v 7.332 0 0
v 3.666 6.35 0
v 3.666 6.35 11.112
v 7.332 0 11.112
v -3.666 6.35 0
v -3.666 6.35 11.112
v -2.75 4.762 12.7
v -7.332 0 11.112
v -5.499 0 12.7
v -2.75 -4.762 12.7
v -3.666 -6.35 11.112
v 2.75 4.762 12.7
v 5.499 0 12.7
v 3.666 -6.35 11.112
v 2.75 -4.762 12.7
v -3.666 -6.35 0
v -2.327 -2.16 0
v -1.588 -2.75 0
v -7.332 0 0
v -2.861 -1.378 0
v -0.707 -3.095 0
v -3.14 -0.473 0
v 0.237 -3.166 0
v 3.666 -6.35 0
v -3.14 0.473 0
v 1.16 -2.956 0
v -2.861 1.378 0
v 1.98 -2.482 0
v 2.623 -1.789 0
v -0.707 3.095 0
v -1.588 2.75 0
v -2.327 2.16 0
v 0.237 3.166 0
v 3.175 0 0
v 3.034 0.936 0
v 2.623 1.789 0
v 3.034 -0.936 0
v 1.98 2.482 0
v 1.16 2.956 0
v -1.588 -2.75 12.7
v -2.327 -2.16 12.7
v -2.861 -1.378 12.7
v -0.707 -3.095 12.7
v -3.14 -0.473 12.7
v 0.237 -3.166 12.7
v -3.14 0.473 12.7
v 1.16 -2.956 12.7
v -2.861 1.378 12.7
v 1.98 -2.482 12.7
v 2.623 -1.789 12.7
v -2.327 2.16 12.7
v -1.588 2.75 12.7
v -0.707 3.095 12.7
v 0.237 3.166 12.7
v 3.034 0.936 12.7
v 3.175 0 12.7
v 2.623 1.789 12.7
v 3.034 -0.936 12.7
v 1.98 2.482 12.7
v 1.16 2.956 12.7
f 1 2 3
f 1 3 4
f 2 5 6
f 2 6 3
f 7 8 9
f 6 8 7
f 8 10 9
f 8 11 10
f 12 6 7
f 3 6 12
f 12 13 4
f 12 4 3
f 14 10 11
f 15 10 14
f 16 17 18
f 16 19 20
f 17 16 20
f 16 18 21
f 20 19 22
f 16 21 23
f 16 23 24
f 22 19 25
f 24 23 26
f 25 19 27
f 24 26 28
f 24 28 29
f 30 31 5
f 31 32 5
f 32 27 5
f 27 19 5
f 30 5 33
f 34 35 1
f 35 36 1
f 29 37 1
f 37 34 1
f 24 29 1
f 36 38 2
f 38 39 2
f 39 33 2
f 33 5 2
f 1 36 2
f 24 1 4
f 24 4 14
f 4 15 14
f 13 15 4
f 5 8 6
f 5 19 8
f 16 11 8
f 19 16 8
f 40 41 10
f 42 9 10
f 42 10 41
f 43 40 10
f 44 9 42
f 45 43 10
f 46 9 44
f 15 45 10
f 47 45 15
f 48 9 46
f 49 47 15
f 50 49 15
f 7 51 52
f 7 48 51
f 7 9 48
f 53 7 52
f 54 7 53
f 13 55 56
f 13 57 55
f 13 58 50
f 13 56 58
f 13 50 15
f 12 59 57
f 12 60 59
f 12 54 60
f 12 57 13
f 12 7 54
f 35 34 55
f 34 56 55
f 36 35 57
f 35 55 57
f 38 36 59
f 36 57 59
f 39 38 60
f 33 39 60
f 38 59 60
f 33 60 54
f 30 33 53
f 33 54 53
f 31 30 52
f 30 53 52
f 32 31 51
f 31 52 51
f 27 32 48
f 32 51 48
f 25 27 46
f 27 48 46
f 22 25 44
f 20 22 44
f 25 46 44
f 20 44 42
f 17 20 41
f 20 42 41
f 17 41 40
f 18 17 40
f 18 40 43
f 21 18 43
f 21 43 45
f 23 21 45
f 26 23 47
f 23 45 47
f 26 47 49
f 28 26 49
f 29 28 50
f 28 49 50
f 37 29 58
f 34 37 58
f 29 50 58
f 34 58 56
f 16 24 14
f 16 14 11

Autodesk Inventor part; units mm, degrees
ref_plane "YZ Plane" through (0, 0, 0) normal (1, 0, 0) x (0, 1, 0)
ref_plane "XZ Plane" through (0, 0, 0) normal (0, 1, 0) x (-1, 0, 0)
ref_plane "XY Plane" through (0, 0, 0) normal (0, 0, 1) x (1, 0, 0)
sketch "Sketch1" plane through (0, 0, 0) normal (0, 0, 1) x (1, 0, 0)
  line L0 (7.3323, 0) -> (3.6662, -6.35)
  line L1 (3.6662, -6.35) -> (-3.6662, -6.35)
  line L2 (-3.6662, -6.35) -> (-7.3323, 0)
  line L3 (-7.3323, 0) -> (-3.6662, 6.35)
  line L4 (-3.6662, 6.35) -> (3.6662, 6.35)
  line L5 (3.6662, 6.35) -> (7.3323, 0)
  point P0 (0, 0)
  point P1 (0, 0)
  dimension "d0" = 12.7
extrude "Extrusion1" add sketch "Sketch1" along normal blind 12.7
sketch "Sketch2" plane through (0, 0, 12.7) normal (0, 0, 1) x (1, 0, 0)
  circle A0 centre (0, 0) radius 3.175
  dimension "d3" = 6.35
extrude "Extrusion2" cut sketch "Sketch2" against normal blind 12.7
chamfer "Chamfer1" distance 1.5875 angle 45 6 edges at (5.4993, 3.175, 12.7) (0, 6.35, 12.7) (-5.4993, 3.175, 12.7) (-5.4993, -3.175, 12.7) (0, -6.35, 12.7) (5.4993, -3.175, 12.7)
properties part number "Bevel Hex Shaft V2"
